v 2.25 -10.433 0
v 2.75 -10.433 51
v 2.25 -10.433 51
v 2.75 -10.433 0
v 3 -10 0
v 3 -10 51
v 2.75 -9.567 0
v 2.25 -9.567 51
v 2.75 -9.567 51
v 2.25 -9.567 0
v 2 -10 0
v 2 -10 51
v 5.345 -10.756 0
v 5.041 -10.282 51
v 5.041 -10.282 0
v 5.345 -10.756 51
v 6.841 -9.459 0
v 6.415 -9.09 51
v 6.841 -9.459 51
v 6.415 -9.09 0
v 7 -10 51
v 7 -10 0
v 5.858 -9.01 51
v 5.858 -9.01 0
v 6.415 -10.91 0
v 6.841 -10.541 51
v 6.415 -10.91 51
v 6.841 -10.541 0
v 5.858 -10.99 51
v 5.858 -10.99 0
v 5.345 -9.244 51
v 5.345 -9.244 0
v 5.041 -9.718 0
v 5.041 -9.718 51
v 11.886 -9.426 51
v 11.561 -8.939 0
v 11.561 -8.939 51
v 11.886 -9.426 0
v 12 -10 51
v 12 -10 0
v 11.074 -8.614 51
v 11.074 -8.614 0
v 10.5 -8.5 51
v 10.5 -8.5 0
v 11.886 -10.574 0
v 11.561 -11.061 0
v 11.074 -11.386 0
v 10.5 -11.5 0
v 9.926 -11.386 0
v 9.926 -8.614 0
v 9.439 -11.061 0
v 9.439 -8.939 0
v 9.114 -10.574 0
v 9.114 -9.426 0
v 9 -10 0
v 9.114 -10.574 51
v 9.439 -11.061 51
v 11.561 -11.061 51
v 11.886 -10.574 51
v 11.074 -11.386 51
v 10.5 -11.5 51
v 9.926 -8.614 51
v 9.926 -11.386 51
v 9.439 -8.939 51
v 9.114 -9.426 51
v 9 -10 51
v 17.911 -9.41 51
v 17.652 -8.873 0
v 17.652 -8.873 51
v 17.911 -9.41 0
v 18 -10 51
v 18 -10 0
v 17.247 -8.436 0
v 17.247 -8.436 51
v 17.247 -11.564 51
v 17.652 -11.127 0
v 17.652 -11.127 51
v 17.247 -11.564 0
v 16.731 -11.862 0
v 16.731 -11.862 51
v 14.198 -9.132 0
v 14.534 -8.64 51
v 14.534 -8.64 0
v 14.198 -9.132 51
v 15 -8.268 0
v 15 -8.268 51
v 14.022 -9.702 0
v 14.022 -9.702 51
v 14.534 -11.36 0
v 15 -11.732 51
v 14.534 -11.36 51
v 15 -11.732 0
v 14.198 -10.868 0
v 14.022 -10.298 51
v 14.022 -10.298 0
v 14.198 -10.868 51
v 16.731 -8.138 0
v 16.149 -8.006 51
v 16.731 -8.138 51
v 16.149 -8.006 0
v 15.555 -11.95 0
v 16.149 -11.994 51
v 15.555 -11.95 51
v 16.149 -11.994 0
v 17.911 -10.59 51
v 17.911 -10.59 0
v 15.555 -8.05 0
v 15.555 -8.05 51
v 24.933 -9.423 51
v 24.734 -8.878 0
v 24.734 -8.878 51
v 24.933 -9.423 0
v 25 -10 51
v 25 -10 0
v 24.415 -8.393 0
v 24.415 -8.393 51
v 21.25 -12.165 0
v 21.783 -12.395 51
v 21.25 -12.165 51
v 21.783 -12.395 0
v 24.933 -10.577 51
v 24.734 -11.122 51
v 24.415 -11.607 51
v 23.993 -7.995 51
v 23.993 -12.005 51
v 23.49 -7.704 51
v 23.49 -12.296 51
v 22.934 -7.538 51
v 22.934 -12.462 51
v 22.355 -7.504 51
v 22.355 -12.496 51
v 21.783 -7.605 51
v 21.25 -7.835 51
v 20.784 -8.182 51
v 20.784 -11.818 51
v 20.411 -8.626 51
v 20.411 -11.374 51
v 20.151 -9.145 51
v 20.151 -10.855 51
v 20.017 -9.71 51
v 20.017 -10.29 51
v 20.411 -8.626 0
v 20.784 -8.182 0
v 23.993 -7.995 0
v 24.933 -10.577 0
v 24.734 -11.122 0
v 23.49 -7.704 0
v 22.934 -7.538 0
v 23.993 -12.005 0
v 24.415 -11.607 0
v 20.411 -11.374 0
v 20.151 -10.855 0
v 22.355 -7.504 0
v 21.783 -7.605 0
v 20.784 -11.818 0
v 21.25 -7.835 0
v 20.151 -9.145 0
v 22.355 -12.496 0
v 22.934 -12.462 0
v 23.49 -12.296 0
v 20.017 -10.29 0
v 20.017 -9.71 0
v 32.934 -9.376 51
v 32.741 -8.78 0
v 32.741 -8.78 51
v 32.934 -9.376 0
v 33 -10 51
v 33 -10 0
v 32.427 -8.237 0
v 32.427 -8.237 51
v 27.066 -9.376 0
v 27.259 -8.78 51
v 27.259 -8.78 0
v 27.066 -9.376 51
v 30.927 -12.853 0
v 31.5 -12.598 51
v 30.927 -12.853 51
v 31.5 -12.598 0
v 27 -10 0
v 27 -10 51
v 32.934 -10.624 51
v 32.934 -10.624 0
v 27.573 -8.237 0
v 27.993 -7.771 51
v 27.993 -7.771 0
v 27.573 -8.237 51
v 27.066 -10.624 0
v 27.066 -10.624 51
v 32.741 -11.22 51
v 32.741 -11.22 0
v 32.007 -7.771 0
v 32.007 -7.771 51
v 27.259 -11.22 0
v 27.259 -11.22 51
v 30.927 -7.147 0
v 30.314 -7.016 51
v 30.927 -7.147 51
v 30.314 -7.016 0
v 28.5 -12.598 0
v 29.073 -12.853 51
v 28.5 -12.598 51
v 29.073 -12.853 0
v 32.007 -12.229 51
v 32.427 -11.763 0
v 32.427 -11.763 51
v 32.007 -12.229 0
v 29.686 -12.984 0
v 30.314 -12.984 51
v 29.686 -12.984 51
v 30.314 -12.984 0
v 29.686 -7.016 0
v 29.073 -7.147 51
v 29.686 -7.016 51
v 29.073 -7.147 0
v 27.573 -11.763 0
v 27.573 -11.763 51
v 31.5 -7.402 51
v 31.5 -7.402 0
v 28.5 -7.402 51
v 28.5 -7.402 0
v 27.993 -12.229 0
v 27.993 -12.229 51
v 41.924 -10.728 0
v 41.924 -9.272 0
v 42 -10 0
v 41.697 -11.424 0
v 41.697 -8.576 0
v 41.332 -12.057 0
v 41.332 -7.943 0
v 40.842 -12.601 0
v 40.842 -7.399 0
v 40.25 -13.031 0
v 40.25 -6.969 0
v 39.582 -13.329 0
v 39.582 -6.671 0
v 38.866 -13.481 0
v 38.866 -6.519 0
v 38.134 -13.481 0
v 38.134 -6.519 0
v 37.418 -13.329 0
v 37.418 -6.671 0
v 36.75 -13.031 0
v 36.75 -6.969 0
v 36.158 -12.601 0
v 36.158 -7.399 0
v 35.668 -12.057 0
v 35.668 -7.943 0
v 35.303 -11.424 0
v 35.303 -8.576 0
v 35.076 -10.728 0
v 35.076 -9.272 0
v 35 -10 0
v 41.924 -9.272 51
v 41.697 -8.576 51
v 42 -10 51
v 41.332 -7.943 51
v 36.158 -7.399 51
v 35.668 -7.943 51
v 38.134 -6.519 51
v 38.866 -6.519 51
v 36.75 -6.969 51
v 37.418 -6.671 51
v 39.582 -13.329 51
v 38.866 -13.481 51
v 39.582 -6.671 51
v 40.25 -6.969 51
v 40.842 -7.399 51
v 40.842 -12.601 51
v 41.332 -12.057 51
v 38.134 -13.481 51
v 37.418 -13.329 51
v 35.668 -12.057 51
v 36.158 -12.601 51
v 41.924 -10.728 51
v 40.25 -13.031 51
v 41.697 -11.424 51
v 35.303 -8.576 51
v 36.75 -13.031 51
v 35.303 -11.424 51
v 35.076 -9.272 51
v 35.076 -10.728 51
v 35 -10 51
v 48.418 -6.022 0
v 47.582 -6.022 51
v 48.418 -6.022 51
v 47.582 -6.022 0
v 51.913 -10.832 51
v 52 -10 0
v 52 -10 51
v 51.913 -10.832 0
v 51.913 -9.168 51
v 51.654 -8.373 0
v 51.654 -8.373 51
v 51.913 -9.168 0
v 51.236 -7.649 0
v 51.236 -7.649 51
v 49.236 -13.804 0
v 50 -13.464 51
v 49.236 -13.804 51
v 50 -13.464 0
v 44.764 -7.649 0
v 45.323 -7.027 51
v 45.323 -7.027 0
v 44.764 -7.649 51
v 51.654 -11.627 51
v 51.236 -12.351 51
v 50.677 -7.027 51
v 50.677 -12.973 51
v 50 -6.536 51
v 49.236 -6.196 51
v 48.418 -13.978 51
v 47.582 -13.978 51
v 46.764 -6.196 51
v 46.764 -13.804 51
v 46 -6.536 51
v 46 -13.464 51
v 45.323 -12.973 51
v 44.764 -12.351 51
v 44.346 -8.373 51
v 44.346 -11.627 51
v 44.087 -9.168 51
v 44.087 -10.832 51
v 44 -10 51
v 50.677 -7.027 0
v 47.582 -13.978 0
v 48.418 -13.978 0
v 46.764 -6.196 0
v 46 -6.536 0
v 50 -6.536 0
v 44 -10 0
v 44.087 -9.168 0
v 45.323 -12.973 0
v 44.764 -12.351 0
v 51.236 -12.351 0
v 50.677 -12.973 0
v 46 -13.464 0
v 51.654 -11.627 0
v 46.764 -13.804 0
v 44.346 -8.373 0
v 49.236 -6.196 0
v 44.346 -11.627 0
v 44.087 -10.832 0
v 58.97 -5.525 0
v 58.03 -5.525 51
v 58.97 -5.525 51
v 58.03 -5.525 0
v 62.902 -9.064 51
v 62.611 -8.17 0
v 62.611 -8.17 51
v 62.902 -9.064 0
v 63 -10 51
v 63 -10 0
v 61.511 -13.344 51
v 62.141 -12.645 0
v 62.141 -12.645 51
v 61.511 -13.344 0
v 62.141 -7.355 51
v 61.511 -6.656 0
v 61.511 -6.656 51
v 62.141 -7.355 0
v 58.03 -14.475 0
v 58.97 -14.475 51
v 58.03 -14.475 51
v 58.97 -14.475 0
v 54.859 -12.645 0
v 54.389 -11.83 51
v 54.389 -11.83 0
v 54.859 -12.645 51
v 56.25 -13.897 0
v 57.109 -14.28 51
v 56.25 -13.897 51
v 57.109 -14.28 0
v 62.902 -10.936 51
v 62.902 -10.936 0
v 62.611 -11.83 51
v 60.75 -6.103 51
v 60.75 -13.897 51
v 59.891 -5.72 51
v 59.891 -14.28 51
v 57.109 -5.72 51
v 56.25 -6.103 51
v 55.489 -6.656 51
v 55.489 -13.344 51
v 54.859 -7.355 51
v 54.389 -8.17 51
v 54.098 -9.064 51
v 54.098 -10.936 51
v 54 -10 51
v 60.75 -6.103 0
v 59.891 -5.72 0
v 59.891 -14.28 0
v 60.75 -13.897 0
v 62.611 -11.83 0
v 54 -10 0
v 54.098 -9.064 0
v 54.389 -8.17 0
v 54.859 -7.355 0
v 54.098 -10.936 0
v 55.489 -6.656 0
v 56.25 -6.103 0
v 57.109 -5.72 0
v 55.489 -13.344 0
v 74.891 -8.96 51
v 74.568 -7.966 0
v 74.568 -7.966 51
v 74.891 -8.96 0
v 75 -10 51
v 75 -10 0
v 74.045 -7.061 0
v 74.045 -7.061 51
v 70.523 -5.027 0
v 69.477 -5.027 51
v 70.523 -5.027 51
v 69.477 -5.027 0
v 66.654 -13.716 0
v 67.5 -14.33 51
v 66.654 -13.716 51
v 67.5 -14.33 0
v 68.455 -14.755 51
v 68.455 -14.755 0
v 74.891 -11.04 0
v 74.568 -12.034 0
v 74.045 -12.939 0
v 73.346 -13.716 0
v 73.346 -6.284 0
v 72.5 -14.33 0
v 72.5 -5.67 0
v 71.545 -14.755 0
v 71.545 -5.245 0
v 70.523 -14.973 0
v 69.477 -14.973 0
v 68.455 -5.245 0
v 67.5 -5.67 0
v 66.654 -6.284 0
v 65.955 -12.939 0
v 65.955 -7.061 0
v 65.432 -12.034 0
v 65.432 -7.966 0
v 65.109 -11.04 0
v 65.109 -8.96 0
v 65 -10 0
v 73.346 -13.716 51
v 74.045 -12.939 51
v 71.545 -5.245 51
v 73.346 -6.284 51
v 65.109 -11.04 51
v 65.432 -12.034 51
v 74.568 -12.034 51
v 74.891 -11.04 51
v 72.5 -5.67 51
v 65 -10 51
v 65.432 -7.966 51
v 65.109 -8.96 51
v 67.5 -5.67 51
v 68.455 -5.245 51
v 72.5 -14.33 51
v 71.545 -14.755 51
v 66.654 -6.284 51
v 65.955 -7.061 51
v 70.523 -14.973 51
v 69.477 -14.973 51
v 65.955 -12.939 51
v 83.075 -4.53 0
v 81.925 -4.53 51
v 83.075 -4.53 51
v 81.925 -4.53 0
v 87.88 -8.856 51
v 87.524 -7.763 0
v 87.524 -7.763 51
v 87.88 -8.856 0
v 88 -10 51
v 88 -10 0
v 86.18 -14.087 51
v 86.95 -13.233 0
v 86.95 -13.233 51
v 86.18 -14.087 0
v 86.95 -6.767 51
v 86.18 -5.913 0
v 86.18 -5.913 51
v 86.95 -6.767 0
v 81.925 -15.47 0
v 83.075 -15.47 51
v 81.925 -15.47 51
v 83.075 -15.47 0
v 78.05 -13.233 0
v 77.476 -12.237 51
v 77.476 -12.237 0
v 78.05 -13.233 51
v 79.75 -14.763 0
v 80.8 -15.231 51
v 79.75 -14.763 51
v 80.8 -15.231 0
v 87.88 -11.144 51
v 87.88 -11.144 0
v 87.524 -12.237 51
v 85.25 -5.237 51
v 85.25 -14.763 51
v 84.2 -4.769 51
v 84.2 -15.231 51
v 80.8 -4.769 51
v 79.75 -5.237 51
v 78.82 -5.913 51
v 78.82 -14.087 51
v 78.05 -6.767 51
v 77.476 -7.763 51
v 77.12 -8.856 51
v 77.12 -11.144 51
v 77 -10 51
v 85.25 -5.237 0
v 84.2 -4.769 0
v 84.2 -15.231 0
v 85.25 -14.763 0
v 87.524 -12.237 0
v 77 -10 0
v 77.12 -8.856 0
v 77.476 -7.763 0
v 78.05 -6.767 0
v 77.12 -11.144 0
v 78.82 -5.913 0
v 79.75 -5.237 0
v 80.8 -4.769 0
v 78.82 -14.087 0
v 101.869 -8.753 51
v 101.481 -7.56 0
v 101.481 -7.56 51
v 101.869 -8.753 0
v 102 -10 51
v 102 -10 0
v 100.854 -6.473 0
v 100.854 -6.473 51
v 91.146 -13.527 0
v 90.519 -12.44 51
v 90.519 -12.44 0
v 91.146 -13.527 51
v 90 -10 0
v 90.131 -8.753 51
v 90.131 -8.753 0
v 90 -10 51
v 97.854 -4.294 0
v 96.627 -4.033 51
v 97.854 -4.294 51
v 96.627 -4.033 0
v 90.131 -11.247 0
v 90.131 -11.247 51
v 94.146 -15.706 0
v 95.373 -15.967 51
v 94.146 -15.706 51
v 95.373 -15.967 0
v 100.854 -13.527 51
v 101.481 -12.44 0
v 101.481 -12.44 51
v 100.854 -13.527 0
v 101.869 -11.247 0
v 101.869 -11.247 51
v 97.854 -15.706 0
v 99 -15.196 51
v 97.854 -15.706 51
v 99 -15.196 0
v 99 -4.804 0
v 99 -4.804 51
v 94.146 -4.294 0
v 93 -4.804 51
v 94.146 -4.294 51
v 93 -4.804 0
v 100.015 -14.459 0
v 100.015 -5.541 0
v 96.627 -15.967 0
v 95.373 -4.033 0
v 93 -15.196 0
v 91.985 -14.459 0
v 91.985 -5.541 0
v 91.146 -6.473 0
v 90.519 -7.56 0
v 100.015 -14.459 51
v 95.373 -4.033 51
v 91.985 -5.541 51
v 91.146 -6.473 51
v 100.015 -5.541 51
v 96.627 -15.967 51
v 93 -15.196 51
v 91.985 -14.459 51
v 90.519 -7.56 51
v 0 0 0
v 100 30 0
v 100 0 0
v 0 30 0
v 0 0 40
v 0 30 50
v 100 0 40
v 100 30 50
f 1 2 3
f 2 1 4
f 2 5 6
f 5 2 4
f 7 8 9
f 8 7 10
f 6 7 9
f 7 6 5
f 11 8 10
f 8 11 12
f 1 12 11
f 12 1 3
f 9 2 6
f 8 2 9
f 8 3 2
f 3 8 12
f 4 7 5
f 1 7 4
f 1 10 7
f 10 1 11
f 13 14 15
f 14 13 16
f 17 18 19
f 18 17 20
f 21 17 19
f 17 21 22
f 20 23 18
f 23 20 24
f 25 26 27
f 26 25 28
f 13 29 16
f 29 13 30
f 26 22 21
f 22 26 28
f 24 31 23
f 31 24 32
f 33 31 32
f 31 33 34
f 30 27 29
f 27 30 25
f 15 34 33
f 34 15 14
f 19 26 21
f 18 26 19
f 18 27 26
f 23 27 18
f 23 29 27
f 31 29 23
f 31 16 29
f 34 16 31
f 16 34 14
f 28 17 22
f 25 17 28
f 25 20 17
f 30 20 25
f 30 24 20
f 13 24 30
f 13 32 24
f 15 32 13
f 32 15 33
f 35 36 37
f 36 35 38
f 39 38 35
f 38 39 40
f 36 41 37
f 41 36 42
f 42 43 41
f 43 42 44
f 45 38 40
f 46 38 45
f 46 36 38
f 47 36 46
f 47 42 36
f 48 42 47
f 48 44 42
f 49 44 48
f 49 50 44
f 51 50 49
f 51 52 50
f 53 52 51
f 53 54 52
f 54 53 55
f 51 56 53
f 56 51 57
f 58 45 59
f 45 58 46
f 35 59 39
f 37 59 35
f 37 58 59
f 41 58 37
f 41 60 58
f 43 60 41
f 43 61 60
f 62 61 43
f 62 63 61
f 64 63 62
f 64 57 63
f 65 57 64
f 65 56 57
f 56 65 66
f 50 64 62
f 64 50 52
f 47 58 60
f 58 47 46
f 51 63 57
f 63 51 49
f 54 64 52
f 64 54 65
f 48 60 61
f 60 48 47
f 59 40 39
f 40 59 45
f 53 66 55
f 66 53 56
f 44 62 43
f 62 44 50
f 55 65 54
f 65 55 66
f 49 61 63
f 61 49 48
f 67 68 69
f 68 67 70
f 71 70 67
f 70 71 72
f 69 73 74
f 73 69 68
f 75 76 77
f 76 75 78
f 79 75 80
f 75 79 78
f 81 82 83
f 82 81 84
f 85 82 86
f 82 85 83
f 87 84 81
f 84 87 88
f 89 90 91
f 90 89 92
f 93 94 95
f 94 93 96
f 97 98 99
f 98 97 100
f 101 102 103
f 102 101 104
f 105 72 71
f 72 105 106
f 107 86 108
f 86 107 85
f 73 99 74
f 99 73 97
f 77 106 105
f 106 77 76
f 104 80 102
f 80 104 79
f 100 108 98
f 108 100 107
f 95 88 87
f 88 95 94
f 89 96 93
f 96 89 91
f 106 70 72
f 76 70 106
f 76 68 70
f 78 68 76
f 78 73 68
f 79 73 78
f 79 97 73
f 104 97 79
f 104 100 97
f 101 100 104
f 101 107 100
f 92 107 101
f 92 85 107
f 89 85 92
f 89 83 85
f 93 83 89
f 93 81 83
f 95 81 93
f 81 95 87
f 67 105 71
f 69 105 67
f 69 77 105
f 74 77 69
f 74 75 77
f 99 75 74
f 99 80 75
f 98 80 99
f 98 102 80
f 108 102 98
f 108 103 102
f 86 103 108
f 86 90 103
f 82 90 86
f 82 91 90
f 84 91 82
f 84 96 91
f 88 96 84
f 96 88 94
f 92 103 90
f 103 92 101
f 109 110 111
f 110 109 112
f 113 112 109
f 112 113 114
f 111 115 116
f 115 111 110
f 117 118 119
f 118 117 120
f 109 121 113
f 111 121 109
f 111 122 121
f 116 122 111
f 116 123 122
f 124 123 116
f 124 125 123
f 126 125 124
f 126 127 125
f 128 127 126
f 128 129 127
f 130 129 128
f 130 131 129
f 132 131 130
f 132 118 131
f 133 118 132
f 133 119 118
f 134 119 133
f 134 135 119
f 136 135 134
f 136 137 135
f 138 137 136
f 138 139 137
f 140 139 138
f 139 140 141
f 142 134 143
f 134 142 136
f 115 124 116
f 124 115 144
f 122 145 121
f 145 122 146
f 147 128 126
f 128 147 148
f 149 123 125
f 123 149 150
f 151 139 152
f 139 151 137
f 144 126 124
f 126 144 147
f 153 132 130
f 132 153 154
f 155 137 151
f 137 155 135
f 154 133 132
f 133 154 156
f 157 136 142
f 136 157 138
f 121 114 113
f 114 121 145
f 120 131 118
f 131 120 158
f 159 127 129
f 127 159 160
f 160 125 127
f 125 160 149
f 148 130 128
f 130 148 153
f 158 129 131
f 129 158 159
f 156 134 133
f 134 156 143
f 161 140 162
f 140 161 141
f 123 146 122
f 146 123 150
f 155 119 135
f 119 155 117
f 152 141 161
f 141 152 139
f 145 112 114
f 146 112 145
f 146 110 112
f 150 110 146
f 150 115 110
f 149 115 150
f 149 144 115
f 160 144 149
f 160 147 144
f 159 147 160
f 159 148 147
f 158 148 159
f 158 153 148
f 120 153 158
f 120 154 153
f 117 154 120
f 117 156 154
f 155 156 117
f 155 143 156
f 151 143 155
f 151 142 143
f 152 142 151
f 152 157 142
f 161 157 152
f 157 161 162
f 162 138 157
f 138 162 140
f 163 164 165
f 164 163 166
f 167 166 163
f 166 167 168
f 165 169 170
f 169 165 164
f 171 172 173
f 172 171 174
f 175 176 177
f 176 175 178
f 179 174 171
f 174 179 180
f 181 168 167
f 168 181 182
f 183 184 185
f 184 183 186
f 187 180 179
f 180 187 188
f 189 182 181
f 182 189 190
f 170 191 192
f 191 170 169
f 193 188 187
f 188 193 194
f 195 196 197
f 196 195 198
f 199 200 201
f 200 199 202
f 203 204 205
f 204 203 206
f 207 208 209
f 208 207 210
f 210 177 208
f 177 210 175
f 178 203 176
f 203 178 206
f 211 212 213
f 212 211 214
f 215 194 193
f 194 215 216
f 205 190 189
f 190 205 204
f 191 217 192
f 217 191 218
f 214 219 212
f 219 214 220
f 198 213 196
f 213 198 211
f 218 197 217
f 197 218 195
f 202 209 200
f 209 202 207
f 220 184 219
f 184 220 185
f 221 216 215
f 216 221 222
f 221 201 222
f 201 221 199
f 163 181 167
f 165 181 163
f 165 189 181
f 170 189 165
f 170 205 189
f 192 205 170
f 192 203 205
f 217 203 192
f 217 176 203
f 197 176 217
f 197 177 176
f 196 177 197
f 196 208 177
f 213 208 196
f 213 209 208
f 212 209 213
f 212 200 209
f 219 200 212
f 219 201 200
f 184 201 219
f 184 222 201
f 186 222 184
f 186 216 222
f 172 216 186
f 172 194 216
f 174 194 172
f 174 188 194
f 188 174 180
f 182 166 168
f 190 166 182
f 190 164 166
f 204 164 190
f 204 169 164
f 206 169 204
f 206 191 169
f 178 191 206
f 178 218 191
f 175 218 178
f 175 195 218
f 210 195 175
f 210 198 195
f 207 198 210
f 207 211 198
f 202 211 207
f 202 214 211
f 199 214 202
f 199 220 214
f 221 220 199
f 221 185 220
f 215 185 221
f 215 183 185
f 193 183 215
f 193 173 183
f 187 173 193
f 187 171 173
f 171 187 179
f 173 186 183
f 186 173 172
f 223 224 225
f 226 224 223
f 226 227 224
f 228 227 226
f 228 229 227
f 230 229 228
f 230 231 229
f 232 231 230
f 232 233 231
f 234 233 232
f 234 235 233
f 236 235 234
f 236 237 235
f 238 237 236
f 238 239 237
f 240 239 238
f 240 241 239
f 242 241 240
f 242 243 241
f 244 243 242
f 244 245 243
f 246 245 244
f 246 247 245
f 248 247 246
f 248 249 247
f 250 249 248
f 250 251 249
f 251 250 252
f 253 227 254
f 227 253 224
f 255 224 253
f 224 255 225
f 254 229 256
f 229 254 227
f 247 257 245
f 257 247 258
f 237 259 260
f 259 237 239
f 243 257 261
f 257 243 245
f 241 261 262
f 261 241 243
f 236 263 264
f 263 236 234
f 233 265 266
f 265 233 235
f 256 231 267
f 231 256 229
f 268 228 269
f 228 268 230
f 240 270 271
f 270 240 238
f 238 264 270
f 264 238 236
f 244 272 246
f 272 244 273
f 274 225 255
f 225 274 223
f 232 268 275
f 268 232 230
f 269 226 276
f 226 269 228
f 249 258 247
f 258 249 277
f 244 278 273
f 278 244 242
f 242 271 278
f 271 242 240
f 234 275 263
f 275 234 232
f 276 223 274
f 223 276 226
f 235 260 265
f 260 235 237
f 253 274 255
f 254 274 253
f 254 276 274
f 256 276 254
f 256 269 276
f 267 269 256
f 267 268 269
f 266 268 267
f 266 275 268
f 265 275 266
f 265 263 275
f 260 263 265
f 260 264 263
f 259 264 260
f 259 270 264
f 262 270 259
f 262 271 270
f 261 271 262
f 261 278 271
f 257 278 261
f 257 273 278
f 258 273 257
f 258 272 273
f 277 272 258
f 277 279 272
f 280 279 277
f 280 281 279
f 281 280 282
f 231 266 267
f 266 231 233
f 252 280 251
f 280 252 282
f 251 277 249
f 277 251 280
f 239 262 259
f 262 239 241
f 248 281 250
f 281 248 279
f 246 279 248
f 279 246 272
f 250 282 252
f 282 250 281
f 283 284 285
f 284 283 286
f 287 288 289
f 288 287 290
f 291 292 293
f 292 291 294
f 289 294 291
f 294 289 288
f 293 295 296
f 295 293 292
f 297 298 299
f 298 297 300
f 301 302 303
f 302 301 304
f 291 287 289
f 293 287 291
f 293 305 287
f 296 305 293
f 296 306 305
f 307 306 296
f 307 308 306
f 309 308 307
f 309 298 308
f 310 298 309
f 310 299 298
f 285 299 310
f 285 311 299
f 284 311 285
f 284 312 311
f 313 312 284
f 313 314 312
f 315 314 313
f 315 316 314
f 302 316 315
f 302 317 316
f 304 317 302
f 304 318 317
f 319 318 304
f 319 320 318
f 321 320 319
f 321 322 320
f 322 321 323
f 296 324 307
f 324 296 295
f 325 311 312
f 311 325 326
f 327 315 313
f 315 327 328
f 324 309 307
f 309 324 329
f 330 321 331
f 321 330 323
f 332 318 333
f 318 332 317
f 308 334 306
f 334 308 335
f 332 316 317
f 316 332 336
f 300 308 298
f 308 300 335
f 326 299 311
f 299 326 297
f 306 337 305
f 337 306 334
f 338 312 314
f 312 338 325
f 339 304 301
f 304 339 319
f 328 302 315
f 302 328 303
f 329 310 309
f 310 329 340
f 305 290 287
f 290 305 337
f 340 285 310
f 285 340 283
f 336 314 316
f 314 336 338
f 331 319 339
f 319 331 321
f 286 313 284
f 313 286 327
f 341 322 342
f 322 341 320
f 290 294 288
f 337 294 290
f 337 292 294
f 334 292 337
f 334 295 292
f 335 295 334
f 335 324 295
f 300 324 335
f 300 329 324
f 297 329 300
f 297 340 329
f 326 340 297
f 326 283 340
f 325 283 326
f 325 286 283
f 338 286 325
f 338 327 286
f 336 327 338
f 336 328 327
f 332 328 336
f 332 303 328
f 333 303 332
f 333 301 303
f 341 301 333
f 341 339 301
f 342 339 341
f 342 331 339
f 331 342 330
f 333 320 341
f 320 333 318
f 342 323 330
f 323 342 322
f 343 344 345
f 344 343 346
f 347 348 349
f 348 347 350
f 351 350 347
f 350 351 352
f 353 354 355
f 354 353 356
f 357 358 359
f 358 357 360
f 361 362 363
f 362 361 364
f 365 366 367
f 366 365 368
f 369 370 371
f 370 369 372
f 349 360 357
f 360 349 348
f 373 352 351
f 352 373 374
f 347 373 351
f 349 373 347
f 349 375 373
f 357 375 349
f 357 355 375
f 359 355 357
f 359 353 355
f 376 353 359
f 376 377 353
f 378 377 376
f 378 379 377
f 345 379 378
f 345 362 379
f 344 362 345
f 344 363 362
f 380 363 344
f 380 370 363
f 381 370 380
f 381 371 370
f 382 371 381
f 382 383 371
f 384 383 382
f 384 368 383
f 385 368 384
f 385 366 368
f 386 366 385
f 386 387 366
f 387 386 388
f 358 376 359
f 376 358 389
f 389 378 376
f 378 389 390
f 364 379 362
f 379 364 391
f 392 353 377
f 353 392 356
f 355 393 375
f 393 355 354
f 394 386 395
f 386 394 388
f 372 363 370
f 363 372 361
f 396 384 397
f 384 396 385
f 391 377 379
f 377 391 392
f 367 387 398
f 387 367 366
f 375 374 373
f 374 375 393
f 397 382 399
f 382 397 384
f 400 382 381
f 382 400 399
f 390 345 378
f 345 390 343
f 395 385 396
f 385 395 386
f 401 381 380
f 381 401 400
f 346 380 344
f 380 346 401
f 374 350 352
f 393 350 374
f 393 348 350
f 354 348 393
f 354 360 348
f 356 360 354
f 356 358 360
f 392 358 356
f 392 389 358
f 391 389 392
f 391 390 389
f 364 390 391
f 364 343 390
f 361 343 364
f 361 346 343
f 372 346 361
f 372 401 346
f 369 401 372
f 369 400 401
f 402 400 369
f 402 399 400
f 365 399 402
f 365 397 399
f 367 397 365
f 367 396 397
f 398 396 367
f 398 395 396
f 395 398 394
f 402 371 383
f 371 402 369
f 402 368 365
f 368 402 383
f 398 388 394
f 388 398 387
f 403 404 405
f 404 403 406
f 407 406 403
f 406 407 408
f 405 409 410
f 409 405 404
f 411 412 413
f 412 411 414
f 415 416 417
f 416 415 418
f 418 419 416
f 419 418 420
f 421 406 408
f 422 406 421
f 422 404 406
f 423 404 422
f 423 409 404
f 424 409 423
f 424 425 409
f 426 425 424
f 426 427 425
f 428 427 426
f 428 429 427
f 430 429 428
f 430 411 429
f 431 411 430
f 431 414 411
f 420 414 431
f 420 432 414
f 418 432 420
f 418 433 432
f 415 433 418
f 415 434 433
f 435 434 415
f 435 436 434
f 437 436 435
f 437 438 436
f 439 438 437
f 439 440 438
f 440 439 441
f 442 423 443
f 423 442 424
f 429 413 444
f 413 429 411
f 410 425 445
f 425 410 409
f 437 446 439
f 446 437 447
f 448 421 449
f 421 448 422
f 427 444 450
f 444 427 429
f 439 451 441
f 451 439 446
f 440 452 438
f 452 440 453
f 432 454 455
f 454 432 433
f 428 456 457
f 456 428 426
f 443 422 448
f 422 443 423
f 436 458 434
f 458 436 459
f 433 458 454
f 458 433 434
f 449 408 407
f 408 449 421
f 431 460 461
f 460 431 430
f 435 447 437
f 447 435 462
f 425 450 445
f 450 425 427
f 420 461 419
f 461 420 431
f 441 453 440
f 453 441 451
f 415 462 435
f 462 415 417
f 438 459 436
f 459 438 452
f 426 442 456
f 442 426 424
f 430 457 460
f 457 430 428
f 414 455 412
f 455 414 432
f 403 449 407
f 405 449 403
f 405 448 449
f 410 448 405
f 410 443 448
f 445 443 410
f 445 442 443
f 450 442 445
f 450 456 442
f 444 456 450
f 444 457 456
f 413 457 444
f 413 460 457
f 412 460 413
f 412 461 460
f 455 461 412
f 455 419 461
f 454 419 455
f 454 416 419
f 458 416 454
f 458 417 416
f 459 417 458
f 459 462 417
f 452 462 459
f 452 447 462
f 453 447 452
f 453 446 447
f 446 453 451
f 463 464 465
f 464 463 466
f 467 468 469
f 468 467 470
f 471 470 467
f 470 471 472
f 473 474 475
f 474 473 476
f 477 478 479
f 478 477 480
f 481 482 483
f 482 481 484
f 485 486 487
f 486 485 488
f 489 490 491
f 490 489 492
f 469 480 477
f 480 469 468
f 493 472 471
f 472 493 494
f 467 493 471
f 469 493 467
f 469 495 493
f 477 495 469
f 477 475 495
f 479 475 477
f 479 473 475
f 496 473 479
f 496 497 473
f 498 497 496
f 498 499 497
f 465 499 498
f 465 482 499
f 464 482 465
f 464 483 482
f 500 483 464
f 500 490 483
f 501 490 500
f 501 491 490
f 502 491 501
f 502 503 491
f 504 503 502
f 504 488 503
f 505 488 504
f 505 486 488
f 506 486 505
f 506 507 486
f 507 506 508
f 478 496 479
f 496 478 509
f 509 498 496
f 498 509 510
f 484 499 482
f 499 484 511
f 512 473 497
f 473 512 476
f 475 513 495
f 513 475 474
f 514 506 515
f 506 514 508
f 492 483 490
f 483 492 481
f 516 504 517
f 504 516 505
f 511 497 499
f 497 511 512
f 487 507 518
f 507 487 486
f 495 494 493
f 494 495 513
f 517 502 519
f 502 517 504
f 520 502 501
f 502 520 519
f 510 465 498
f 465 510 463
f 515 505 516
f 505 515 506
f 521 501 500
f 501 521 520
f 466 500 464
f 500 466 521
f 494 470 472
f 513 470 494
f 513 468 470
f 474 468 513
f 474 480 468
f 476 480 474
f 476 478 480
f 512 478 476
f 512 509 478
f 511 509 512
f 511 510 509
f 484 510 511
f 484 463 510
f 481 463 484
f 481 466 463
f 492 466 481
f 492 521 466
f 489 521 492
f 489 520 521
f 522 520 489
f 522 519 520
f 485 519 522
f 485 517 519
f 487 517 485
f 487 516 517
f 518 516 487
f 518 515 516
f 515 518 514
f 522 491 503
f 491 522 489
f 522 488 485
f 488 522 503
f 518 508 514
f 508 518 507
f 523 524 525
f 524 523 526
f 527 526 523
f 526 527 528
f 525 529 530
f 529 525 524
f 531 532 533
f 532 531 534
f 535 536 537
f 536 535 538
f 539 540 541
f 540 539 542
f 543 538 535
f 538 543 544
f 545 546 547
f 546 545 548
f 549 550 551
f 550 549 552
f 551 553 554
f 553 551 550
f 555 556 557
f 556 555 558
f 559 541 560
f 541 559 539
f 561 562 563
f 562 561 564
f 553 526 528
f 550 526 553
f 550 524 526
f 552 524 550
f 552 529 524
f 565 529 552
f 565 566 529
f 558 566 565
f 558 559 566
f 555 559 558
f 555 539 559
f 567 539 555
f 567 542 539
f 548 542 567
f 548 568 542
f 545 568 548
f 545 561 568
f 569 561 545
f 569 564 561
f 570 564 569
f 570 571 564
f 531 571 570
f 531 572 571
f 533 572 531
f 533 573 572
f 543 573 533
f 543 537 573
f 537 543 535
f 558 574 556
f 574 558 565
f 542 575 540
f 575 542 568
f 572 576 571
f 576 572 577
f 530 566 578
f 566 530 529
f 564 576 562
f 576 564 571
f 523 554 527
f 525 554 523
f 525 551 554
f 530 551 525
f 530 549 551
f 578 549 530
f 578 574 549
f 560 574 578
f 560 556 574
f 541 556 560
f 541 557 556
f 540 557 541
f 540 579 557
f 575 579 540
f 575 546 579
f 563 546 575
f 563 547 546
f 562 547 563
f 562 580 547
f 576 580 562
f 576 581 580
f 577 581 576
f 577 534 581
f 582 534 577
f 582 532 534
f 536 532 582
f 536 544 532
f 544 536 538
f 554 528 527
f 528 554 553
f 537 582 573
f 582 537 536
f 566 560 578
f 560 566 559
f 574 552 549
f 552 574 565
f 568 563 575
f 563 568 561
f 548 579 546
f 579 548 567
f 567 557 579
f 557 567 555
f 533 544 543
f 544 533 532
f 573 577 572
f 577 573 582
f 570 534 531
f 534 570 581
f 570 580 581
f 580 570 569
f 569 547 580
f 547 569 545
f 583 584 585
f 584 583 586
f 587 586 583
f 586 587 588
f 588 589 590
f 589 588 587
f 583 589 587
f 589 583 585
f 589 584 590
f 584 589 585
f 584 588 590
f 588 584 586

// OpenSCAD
$fs=0.6;
width = 100;
depth = 30;
frontHeight = 40;
backHeight = 50;

module mainBlock(width, depth, frontHeight, backHeight) {
    CubePoints = [
    [  0,  0,  0 ],  //0
    [ width,  0,  0 ],  //1
    [ width,  depth,  0 ],  //2
    [  0,  depth,  0 ],  //3
    [  0,  0,  frontHeight ],  //4
    [ width,  0,  frontHeight ],  //5
    [ width,  depth,  backHeight ],  //6
    [  0,  depth,  backHeight ]]; //7
  
    CubeFaces = [
    [0,1,2,3],  // bottom
    [4,5,1,0],  // front
    [7,6,5,4],  // top
    [5,6,2,1],  // right
    [6,7,3,2],  // back
    [7,4,0,3]]; // left
    
    polyhedron(CubePoints, CubeFaces);
}

mainBlock(width, depth, frontHeight, backHeight);

for(d = [1:12]) {
    translate ([((d * (d + 1)) / 2) + d * 1.5, -10, 0]) cylinder(backHeight + 1, d = d);
}
